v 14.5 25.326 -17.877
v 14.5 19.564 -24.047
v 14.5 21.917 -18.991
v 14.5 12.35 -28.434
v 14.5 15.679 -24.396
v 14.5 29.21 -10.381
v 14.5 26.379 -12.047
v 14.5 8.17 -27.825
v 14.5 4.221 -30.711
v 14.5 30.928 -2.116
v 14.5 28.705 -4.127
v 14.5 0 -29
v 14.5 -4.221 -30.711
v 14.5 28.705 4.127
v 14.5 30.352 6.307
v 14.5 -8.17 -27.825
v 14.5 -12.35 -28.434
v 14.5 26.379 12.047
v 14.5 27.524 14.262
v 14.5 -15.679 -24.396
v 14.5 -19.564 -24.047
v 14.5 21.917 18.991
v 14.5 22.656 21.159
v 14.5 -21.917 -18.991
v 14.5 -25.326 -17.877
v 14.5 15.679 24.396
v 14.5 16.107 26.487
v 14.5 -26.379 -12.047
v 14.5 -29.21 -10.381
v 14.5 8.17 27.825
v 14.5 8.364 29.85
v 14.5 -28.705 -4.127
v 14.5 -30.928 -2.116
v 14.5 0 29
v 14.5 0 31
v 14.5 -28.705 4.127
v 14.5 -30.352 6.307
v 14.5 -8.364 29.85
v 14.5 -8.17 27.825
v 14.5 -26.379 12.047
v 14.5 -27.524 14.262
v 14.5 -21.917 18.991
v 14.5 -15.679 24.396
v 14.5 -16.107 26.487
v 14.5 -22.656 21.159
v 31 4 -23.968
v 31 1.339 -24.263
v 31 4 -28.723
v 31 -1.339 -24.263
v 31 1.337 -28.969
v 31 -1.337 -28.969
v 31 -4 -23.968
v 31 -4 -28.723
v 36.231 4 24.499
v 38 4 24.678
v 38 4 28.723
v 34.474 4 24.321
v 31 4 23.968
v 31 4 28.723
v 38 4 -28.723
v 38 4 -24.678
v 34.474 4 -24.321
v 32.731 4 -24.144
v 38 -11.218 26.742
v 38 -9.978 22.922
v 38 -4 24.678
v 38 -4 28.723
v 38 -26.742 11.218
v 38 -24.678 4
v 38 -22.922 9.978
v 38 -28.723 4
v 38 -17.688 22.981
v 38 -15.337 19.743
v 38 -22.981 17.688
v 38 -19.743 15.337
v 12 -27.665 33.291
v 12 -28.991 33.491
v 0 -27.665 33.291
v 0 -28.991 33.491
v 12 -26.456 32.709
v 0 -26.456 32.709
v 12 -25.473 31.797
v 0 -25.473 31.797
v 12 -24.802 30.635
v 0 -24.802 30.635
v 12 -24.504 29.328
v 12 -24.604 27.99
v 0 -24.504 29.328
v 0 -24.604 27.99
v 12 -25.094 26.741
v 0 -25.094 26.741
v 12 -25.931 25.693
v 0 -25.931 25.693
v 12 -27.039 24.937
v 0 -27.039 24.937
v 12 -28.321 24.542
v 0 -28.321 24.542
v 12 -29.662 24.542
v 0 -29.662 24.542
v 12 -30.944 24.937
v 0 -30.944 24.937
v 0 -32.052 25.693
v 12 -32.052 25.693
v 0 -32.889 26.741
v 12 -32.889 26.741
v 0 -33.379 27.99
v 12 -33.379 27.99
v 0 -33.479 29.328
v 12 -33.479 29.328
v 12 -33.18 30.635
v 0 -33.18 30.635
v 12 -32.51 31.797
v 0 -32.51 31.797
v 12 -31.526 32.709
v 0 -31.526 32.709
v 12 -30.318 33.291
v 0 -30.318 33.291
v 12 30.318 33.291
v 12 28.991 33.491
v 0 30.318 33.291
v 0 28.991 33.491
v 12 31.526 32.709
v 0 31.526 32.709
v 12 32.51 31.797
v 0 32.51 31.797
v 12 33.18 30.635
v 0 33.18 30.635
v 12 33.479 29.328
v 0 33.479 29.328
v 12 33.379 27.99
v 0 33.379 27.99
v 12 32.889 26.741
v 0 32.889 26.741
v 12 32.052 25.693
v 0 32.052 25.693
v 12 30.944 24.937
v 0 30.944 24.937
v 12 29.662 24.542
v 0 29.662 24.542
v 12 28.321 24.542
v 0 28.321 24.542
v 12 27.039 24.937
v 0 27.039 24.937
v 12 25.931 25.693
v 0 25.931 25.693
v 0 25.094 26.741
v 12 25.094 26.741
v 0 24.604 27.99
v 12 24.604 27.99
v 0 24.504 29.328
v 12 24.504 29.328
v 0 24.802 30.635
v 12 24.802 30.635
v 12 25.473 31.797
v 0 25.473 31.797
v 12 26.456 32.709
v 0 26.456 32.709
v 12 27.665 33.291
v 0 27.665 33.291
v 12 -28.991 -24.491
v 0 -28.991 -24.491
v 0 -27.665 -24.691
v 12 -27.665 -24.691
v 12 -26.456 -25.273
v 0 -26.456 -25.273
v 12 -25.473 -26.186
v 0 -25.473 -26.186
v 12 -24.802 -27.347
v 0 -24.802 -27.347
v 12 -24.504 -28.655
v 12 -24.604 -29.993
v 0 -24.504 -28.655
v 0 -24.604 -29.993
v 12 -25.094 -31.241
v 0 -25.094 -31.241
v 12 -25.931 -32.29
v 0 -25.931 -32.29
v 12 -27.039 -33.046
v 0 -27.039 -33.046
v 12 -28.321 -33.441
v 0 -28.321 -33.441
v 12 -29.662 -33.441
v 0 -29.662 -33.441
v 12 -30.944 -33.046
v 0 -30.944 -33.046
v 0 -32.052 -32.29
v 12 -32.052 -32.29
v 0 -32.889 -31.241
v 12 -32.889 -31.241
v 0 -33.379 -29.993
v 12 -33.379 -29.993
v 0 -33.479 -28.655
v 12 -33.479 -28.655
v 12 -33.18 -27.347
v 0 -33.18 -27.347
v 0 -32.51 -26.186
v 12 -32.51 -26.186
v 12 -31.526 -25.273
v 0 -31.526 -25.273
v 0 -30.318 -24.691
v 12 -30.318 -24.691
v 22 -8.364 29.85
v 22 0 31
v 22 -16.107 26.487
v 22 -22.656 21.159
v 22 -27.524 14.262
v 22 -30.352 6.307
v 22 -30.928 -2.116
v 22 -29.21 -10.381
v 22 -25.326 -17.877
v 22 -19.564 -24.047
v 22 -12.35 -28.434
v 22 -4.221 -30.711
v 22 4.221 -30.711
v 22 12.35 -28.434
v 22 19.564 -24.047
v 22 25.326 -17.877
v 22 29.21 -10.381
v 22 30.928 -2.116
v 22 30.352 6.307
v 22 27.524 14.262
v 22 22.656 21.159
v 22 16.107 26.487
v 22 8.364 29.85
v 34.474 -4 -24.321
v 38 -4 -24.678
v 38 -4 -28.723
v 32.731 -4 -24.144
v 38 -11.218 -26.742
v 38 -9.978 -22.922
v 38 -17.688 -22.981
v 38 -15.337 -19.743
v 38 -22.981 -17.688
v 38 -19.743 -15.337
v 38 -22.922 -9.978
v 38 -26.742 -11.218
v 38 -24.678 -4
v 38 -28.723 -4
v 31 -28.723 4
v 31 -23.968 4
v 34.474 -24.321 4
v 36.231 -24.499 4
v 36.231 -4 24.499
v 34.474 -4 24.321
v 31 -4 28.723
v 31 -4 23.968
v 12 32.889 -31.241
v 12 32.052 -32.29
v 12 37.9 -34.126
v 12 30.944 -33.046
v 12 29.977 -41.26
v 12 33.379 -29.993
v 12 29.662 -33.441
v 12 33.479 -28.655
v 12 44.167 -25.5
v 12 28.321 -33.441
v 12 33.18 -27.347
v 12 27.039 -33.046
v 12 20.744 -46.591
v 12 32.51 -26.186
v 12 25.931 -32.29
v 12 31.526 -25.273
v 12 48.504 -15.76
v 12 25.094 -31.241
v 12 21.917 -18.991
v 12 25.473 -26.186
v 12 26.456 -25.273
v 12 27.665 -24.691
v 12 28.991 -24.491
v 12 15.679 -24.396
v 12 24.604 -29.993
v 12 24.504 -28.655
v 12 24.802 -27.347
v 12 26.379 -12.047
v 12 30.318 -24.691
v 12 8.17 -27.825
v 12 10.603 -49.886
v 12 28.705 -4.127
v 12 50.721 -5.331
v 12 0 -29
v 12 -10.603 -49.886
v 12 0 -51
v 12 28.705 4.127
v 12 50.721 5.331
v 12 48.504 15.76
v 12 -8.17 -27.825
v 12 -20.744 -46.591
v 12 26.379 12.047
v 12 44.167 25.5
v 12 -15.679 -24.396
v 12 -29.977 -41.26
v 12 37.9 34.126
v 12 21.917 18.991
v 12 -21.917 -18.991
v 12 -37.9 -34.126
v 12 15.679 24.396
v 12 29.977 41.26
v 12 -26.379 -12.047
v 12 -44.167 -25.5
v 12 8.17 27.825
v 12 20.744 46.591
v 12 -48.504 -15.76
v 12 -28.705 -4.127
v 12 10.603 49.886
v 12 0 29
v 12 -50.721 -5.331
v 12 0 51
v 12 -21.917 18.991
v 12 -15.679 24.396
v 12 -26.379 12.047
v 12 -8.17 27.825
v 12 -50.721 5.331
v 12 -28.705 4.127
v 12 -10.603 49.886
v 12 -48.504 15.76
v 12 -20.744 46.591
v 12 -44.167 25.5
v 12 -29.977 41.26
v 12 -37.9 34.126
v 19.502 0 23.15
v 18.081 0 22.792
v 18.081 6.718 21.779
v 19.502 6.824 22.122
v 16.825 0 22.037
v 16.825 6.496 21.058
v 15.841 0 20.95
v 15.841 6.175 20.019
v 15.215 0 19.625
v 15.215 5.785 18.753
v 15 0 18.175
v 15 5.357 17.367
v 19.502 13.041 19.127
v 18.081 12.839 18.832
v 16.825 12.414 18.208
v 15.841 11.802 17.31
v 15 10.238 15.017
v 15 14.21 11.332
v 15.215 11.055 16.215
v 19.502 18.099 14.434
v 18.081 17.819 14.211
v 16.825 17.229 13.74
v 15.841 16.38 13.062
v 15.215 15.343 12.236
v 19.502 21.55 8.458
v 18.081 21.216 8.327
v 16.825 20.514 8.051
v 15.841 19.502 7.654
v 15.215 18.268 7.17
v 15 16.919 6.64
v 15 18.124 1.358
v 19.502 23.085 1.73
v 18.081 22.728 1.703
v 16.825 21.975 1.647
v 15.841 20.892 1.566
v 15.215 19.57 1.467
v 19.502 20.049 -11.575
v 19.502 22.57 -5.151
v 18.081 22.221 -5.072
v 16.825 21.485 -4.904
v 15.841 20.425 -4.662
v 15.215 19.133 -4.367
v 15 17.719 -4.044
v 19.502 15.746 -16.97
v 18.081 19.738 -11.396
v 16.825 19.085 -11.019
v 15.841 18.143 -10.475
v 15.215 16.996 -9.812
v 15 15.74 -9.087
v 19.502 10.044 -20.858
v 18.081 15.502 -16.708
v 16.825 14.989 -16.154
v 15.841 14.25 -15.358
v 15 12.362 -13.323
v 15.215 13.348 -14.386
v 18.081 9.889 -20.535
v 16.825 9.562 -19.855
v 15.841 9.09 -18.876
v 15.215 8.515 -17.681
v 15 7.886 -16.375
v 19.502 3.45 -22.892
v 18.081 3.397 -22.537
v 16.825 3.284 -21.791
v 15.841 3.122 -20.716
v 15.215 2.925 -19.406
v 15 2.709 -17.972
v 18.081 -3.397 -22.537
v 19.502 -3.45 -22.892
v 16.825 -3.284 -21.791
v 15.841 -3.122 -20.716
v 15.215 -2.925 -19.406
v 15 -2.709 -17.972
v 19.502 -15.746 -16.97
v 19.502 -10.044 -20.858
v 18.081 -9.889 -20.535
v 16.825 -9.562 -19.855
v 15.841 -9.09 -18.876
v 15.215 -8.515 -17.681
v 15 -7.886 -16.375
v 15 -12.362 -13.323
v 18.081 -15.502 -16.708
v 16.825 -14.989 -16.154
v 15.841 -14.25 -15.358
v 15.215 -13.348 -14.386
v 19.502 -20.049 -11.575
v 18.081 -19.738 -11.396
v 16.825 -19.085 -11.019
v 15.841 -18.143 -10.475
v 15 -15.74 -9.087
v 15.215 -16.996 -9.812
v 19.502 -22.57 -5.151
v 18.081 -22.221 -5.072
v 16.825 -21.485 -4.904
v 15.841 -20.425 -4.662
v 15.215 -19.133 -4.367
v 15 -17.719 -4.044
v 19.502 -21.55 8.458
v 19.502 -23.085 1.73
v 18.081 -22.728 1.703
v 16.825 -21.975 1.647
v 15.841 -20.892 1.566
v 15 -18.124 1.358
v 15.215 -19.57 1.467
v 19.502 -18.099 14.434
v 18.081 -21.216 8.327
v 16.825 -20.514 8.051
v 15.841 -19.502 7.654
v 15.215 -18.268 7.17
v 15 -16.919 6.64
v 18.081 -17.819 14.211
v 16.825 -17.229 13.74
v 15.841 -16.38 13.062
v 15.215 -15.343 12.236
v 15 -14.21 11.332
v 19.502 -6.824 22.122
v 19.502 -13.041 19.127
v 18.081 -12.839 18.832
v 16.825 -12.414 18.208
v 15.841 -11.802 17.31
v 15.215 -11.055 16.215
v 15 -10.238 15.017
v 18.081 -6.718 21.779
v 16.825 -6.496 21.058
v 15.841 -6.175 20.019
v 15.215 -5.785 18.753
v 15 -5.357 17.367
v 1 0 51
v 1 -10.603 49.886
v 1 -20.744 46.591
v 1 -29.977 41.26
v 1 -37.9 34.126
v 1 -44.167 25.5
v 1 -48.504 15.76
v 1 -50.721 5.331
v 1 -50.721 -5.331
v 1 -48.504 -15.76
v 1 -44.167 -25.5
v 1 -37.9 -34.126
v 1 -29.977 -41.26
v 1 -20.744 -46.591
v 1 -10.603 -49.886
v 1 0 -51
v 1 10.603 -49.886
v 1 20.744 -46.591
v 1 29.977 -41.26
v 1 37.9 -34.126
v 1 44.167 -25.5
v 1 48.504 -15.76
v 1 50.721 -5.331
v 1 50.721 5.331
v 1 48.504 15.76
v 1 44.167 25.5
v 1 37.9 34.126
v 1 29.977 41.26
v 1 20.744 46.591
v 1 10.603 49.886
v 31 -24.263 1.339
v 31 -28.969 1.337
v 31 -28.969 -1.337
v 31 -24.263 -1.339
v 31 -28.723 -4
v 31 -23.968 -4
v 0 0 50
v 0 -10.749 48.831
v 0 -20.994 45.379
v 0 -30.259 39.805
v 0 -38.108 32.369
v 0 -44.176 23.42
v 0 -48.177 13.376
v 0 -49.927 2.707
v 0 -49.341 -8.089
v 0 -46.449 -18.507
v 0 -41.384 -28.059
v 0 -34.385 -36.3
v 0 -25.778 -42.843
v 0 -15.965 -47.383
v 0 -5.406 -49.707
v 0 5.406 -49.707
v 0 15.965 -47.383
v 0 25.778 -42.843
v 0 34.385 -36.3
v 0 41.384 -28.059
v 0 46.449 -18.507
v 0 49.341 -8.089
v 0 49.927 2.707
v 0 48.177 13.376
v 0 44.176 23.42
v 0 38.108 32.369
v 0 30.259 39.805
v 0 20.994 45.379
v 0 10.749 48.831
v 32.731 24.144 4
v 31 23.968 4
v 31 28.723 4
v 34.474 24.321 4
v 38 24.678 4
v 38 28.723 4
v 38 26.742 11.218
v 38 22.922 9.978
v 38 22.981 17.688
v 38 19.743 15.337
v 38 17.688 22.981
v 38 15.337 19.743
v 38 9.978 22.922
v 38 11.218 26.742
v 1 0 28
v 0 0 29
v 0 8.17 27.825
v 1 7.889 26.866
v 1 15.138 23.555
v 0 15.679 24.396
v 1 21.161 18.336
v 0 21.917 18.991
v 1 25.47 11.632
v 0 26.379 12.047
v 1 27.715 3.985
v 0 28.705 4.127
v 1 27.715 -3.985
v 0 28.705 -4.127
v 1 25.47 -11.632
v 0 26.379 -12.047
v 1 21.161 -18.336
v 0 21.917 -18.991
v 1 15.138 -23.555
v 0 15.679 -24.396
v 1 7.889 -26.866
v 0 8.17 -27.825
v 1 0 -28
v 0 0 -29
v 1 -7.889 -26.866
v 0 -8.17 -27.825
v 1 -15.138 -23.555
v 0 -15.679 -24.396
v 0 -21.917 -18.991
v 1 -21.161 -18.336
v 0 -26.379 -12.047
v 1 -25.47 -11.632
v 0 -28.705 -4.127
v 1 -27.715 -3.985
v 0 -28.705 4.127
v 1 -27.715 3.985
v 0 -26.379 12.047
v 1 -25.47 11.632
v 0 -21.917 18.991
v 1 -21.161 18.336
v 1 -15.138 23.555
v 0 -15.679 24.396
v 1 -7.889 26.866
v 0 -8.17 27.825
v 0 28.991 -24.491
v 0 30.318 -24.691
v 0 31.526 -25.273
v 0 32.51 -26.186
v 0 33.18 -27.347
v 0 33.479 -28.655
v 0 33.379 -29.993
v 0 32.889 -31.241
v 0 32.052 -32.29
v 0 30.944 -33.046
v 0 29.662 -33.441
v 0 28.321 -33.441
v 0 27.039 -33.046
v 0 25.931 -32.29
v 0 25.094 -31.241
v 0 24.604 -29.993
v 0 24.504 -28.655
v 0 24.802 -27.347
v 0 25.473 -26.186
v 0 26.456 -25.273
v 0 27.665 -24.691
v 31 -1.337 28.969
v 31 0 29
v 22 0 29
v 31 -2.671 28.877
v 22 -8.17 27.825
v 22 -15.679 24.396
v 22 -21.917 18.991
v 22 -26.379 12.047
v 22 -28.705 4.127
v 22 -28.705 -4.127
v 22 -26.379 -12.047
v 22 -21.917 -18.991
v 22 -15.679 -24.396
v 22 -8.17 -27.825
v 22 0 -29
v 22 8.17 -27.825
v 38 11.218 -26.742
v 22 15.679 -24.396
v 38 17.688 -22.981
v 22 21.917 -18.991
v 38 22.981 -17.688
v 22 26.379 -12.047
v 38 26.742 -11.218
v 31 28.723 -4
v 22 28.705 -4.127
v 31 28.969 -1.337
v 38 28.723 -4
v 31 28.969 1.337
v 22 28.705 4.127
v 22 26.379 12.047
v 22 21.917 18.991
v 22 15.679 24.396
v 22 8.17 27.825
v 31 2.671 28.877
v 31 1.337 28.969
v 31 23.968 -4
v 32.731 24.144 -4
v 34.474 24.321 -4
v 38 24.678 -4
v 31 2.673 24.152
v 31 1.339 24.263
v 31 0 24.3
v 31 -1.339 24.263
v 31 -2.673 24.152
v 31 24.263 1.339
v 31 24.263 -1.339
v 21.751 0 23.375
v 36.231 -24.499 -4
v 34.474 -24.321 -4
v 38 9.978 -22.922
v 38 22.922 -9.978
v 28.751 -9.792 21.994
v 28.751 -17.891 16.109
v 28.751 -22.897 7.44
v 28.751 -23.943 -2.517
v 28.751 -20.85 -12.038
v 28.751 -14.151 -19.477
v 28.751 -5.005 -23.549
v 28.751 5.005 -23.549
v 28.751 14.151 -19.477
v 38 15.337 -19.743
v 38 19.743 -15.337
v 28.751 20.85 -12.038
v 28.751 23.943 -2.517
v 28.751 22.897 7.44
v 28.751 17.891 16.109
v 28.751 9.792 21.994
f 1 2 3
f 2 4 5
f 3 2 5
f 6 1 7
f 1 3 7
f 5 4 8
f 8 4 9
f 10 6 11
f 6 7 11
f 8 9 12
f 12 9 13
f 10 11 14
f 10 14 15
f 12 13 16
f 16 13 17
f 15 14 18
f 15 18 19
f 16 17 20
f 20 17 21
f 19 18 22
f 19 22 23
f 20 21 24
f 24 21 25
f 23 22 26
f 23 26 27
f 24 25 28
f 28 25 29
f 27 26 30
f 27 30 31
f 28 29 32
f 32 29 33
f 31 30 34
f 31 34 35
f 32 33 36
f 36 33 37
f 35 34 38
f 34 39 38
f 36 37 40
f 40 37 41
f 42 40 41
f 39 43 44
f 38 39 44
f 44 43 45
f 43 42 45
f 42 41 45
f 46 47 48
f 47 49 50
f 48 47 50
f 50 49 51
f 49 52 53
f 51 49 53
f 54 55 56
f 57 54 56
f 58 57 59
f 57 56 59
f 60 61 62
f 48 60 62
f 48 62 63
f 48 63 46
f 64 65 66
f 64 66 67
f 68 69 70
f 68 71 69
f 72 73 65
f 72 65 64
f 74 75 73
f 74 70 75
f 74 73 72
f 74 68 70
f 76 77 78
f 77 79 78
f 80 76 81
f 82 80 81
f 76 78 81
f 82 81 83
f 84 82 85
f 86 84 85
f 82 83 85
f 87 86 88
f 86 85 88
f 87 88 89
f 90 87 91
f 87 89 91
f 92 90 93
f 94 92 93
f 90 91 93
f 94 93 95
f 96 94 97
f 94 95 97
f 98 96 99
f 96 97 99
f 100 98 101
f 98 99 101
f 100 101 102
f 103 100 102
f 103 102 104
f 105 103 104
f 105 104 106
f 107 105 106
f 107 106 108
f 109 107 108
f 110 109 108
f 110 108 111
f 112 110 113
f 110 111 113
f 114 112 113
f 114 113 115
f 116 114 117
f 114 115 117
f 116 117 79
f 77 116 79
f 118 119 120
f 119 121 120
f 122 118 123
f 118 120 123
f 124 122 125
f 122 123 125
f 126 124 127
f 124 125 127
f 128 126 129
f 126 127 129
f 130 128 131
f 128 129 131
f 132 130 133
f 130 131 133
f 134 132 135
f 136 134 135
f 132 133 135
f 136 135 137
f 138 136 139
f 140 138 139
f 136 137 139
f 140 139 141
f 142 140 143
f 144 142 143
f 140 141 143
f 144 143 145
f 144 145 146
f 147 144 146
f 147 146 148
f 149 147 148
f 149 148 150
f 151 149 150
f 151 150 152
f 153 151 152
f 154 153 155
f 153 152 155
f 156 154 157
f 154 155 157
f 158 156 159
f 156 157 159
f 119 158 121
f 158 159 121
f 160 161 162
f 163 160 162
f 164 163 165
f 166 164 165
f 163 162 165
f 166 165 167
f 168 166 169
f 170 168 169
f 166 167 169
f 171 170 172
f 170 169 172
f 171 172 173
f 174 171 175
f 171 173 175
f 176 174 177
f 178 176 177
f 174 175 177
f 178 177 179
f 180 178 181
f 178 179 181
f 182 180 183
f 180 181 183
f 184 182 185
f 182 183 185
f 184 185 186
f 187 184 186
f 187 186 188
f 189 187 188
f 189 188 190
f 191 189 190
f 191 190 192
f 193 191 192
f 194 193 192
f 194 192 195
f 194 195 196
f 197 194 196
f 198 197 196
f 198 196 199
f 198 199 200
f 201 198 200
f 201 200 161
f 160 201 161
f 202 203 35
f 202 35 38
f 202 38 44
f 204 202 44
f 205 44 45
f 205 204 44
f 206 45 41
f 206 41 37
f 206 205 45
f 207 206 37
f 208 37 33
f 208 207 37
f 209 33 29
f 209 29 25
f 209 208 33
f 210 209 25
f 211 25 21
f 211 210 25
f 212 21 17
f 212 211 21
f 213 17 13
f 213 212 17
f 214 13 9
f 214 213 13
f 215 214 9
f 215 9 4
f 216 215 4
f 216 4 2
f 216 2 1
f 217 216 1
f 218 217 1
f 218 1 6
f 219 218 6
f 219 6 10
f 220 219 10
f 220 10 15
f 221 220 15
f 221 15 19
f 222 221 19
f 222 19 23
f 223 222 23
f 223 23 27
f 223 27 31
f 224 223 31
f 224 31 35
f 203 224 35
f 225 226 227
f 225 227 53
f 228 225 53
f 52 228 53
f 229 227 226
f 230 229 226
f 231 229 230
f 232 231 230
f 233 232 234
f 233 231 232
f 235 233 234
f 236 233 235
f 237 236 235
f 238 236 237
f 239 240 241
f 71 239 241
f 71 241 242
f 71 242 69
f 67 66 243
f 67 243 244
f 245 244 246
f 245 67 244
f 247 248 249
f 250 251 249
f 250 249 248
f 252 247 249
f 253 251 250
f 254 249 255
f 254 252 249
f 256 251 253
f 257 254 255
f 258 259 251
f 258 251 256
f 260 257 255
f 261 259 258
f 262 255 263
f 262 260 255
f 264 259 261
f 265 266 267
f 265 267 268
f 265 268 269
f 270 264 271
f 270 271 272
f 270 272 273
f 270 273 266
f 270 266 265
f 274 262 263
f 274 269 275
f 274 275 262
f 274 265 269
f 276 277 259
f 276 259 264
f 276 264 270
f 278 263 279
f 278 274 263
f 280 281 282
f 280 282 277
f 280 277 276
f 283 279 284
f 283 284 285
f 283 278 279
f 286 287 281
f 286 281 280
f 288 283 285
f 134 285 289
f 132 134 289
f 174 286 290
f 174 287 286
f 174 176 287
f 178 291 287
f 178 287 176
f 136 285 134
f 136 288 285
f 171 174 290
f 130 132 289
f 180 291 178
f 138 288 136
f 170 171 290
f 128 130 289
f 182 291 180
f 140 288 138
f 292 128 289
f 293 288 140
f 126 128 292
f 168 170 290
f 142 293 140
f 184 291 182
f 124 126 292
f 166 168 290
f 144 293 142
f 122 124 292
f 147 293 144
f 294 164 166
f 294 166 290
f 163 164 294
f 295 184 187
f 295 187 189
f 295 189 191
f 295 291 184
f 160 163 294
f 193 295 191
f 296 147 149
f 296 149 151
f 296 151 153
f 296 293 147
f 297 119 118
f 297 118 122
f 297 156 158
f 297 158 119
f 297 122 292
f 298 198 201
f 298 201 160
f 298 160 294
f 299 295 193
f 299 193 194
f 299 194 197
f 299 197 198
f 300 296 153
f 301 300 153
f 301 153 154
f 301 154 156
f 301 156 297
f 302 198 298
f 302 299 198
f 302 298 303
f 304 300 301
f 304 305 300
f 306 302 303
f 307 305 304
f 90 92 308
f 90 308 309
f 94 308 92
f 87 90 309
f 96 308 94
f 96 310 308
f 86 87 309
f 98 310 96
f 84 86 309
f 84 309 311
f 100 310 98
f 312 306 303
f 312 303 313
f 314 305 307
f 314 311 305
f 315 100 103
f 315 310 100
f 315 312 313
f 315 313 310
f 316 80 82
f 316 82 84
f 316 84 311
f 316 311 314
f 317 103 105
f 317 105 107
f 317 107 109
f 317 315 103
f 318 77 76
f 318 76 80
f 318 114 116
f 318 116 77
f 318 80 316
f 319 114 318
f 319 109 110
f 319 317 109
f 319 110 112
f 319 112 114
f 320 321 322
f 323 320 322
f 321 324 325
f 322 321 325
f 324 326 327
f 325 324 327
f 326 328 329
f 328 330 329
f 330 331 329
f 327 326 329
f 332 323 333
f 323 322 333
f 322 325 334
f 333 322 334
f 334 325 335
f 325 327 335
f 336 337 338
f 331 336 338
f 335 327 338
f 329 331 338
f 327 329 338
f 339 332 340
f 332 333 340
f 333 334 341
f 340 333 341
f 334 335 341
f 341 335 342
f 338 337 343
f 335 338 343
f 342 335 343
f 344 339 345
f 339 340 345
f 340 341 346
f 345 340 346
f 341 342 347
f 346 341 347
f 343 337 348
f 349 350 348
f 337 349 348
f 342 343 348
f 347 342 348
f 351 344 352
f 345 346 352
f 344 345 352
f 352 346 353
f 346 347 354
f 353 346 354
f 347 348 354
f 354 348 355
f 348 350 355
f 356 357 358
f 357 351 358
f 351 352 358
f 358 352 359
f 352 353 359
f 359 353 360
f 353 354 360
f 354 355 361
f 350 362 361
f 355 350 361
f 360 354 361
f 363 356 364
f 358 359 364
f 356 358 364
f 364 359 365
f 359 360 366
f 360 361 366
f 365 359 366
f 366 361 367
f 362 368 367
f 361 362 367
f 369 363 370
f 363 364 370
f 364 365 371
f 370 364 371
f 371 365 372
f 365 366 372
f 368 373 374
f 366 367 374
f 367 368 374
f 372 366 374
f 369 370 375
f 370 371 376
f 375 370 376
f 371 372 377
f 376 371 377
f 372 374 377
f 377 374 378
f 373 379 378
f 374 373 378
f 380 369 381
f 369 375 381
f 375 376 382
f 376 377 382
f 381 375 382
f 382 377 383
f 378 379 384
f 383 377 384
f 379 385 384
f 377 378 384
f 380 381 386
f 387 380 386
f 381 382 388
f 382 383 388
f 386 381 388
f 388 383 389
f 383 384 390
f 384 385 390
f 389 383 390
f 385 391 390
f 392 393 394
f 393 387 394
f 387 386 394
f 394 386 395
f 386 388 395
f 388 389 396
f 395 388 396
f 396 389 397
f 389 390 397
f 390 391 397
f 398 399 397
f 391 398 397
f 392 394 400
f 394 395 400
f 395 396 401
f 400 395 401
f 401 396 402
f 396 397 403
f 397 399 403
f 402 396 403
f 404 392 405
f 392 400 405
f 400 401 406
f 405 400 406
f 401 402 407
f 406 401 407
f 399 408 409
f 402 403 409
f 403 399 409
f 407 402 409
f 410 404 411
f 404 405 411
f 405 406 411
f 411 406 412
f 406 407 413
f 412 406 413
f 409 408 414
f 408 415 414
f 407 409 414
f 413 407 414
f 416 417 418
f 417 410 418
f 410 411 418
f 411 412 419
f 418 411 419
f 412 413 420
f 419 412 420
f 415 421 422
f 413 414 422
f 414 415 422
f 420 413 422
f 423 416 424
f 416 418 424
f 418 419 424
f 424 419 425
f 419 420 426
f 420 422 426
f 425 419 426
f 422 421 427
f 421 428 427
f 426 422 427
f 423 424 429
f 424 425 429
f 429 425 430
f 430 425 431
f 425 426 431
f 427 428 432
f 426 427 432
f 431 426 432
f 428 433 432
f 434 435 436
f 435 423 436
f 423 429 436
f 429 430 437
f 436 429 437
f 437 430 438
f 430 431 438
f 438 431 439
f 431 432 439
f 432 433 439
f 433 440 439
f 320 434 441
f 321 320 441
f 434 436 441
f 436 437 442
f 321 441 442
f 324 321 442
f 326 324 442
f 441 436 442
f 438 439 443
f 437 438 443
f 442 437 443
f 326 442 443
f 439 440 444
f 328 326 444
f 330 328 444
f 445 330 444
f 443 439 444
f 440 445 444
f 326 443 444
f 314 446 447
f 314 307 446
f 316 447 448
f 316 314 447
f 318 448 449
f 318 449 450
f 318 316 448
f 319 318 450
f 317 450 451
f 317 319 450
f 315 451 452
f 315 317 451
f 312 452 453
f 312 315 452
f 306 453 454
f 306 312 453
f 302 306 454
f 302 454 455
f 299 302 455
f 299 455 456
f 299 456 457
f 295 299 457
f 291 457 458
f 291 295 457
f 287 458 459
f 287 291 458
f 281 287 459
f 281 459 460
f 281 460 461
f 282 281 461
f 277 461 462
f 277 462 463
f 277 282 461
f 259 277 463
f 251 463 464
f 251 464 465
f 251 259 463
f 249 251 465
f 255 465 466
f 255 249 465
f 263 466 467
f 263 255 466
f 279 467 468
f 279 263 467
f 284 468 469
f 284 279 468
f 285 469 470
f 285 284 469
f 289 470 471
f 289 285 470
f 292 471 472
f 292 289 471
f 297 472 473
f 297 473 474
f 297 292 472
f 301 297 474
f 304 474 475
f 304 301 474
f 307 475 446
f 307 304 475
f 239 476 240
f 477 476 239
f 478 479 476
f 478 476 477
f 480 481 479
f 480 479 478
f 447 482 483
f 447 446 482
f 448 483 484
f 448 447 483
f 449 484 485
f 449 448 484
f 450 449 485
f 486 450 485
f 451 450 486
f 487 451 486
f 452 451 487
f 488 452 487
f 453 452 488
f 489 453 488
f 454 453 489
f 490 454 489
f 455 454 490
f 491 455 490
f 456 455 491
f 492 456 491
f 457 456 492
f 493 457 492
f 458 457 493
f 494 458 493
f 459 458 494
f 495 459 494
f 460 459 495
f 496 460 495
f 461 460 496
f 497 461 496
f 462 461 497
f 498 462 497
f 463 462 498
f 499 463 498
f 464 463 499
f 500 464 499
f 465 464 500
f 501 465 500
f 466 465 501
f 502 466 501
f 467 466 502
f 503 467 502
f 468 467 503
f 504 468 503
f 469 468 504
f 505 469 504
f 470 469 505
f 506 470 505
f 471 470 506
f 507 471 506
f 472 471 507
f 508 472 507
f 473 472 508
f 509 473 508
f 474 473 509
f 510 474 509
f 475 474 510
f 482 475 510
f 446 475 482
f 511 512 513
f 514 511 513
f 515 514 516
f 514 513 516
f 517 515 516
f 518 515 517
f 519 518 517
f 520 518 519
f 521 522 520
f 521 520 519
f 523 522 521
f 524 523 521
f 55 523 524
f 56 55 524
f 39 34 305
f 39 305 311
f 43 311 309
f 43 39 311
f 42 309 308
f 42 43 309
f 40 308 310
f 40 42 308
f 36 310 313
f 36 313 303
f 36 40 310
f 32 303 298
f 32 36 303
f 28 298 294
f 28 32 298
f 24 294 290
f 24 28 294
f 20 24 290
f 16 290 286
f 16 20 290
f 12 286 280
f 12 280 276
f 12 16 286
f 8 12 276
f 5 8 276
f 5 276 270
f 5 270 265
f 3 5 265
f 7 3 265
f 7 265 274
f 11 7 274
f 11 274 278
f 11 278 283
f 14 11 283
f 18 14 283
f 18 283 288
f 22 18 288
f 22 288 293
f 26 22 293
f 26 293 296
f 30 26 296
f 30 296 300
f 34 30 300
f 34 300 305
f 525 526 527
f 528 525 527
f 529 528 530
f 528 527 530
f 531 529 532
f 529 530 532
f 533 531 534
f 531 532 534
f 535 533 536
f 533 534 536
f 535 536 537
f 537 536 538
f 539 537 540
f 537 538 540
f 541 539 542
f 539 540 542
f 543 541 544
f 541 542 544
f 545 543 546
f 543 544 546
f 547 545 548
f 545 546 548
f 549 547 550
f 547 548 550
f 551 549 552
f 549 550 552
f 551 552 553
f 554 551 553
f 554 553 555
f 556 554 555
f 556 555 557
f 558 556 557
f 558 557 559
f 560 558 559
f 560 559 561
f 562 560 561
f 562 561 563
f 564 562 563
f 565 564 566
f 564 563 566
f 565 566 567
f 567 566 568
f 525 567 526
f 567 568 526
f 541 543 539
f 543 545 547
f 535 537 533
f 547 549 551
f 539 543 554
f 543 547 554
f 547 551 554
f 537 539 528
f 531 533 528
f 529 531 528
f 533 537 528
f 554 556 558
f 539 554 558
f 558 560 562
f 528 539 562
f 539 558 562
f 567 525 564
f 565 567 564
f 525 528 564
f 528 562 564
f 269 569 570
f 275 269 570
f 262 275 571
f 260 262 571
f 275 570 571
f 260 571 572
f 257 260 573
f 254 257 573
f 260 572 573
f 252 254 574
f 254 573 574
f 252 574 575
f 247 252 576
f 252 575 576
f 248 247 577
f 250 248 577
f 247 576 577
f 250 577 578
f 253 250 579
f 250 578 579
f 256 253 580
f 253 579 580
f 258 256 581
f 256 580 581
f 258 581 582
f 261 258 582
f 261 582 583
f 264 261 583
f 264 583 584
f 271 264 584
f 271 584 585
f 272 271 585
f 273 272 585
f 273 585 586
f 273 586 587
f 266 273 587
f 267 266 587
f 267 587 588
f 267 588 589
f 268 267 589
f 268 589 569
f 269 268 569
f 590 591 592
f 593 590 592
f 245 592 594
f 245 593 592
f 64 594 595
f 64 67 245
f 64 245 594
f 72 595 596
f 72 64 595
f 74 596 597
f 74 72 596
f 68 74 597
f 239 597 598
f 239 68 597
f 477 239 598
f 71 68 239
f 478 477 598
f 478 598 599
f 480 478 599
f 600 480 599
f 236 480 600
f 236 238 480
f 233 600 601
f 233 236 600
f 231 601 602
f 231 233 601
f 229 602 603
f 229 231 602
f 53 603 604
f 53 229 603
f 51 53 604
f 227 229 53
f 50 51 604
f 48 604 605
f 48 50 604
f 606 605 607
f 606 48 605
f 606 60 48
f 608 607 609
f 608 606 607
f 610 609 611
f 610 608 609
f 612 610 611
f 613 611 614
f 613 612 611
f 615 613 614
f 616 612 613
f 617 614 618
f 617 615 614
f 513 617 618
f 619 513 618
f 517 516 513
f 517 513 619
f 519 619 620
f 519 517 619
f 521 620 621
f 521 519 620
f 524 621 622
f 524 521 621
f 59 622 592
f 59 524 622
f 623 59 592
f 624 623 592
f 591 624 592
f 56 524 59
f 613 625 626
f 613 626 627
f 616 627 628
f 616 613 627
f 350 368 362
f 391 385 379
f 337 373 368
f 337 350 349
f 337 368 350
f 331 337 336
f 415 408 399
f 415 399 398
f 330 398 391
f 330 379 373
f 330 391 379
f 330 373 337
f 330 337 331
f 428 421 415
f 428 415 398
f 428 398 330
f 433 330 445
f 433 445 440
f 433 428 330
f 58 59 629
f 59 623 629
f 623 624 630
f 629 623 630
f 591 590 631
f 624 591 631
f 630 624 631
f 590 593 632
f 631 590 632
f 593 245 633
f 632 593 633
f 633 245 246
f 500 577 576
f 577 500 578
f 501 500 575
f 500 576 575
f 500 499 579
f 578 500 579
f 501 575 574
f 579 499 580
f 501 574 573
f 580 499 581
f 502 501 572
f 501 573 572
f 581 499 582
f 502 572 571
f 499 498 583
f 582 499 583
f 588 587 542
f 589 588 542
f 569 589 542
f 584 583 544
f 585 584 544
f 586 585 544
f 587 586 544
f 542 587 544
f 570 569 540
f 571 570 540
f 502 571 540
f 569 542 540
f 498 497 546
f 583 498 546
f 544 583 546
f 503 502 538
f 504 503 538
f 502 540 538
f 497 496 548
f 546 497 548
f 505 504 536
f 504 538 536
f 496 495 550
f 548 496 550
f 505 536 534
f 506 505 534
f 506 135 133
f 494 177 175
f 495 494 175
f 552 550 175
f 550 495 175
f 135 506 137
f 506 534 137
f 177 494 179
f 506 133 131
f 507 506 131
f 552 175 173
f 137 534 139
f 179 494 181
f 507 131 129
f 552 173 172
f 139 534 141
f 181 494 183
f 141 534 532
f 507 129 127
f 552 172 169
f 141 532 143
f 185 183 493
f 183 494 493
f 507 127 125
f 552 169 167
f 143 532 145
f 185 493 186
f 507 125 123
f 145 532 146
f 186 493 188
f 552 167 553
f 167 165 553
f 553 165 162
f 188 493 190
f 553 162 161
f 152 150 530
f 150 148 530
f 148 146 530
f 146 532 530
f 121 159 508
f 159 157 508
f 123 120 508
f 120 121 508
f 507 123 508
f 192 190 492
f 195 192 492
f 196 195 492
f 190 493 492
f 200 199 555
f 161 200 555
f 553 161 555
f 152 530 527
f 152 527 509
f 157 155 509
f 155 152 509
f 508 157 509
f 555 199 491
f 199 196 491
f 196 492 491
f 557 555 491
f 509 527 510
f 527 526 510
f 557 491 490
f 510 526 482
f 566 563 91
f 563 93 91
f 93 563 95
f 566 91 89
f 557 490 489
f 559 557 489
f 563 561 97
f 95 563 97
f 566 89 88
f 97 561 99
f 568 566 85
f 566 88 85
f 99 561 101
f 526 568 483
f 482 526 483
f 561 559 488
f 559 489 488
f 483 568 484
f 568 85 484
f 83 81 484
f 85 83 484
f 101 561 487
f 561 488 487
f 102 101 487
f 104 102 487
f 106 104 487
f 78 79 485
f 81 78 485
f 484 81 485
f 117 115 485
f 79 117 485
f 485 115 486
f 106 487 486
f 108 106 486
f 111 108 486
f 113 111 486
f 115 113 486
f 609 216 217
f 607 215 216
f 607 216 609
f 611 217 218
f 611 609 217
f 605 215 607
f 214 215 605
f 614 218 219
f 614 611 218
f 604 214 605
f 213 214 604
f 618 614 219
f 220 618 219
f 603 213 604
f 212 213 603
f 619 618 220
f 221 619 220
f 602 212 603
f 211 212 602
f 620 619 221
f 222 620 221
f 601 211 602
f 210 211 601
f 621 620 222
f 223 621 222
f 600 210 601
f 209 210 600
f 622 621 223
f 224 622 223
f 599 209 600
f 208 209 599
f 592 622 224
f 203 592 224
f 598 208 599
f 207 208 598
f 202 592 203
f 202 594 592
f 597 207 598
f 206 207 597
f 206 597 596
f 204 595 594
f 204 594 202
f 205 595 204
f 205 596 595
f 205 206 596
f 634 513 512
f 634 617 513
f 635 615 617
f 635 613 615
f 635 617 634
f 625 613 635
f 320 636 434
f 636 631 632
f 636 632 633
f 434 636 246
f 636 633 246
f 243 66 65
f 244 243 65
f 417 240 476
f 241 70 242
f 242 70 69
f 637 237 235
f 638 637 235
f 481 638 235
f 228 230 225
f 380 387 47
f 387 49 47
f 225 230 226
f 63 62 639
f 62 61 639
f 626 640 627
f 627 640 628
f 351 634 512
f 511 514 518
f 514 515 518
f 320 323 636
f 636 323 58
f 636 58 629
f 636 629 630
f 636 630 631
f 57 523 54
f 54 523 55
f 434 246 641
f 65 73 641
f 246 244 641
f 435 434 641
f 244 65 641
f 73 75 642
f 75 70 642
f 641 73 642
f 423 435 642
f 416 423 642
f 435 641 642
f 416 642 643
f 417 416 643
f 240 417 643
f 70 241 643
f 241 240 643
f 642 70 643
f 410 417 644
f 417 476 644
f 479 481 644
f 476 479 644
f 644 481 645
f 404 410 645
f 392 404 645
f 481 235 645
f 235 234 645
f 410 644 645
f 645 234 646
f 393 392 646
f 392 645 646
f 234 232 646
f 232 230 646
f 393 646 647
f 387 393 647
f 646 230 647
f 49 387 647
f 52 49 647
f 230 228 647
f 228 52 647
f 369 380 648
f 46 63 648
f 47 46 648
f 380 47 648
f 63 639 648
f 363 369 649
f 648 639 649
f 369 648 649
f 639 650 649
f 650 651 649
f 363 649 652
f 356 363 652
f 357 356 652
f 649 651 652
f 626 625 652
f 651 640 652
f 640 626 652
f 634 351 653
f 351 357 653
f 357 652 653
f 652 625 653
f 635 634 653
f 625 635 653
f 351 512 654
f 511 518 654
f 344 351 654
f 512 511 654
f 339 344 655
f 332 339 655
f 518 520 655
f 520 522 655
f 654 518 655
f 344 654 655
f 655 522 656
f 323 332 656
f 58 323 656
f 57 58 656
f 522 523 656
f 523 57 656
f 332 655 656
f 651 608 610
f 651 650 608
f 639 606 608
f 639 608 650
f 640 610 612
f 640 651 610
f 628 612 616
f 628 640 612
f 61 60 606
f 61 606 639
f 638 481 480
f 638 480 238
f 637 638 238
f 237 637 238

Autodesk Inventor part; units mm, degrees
ref_plane "YZ Plane" through (0, 0, 0) normal (1, 0, 0) x (0, 1, 0)
ref_plane "XZ Plane" through (0, 0, 0) normal (0, 1, 0) x (-1, 0, 0)
ref_plane "XY Plane" through (0, 0, 0) normal (0, 0, 1) x (1, 0, 0)
sketch "草图1" plane through (0, 0, 0) normal (0, 1, 0) x (-1, 0, 0)
  line L0 (0, 51) -> (-12, 51)
  line L1 (-12, 51) -> (-12, 29)
  line L2 (-12, 29) -> (-14.5, 29)
  line L3 (-14.5, 29) -> (-14.5, 31)
  line L4 (-14.5, 31) -> (-22, 31)
  line L5 (-22, 31) -> (-22, 29)
  line L6 (-22, 29) -> (-38, 29)
  line L7 (-38, 29) -> (-38, 0)
  line L8 (-38, 0) -> (0, 0)
  line L9 (0, 0) -> (0, 51)
  line L10 (0, 29) -> (-1, 28)
  line L11 (-1, 28) -> (-1, 0)
  line L12 (-38, 25) -> (-15, 22.6998)
  line L13 (-15, 22.6998) -> (-15, 0)
  line L14 (7.6, 0) -> (-45.6, 0) projected
  dimension "d2" = 51
  dimension "d4" = 26
  dimension "d5" = 12
  dimension "d6" = 31
  dimension "d7" = 29
  dimension "d8" = 10
  dimension "d9" = 2.5
  dimension "d10" = 29
  dimension "d11" = 45
  dimension "d12" = 1
  dimension "d13" = 15
  dimension "d14" = 25
  dimension "d15" = 84.289
revolve "旋转1" add sketch "草图1" angle 360 about axis through (-10, 0, 0) along (1, 0, 0) contours L9 L10 L11 L8 L13 L12 L7 L6 L5 L4 L3 L2 L1 L0
sketch "草图2" plane through (0, 0, 0) normal (0, 1, 0) x (-1, 0, 0)
  line L0 (-22, 29) -> (-38, 29) projected
  line L1 (-38, 29) -> (-31, 29)
  line L2 (-31, 29) -> (-31, -29)
  line L3 (-31, -29) -> (-38, -29)
  line L4 (-38, -29) -> (-38, 29)
  point P0 (0, 0)
  dimension "d17" = 7
extrude "拉伸1" cut sketch "草图2" along normal mid plane 8
sketch "草图3" plane through (0, 0, 0) normal (0, 0, 1) x (1, 0, 0)
  line L0 (38, 4) -> (38, 29) projected
  line L1 (22, -29) -> (38, -29) projected
  line L2 (38, 29) -> (31, 29)
  line L3 (31, 29) -> (31, -29)
  line L4 (31, -29) -> (38, -29)
  line L5 (38, -29) -> (38, 29)
  point P0 (0, 0)
  dimension "d20" = 7
extrude "拉伸2" cut sketch "草图3" along normal mid plane 8
sketch "草图4" plane through (0, 0, 0) normal (-1, 0, 0) x (0, 0, 1)
  circle A0 centre (28.9914, 28.9914) radius 4.5
  circle A1 centre (-28.9914, 28.9914) radius 4.5
  circle A2 centre (-28.9914, -28.9914) radius 4.5
  circle A3 centre (28.9914, -28.9914) radius 4.5
  line L0 (28.9914, 28.9914) -> (0, 0)
  line L1 (0, -71.4) -> (0, 71.4) projected
  dimension "d23" = 9
  dimension "d24" = 41
  dimension "d27" = 360
  dimension "d35" = 45
extrude "拉伸3" cut sketch "草图4" against normal up to surface (12 mm away)
chamfer "倒角1" distance 1 angle 45 1 edges at (0, 0, -51)
fillet "圆角1" radius 5 1 edges at (15, 0, -22.6998)
equation "\"d2\" = 0.5 * D2"
equation "\"d4\" = M"
equation "\"d5\" = e"
equation "\"d6\" = 0.5 * D"
equation "\"d7\" = 0.5 * D_d"
equation "\"d8\" = e1"
equation "\"d10\" = 0.5 * D_d"
equation "\"d13\" = b1"
equation "\"d14\" = 0.5 * D4"
equation "\"d17\" = h_b"
equation "\"d18\" = b"
equation "\"d20\" = h_b"
equation "\"d21\" = b"
equation "\"d23\" = d0"
equation "\"d24\" = 0.5 * D0"
equation "\"d29\" = b"
equation "\"d3\" = 8"
equation "\"d0\" = 9"
equation "\"D\" = 62"
equation "\"D0\" = 82"
equation "\"D2\" = 102"
equation "\"D_d\" = 58"
equation "\"e\" = 12"
equation "\"e1\" = 10"
equation "\"b\" = 8"
equation "\"h_b\" = 7"
equation "\"M\" = 26"
equation "\"b1\" = 15"
equation "\"d1\" = 26"
equation "\"D4\" = 50"
properties part number "高速轴承闷盖" material "灰口铁"
